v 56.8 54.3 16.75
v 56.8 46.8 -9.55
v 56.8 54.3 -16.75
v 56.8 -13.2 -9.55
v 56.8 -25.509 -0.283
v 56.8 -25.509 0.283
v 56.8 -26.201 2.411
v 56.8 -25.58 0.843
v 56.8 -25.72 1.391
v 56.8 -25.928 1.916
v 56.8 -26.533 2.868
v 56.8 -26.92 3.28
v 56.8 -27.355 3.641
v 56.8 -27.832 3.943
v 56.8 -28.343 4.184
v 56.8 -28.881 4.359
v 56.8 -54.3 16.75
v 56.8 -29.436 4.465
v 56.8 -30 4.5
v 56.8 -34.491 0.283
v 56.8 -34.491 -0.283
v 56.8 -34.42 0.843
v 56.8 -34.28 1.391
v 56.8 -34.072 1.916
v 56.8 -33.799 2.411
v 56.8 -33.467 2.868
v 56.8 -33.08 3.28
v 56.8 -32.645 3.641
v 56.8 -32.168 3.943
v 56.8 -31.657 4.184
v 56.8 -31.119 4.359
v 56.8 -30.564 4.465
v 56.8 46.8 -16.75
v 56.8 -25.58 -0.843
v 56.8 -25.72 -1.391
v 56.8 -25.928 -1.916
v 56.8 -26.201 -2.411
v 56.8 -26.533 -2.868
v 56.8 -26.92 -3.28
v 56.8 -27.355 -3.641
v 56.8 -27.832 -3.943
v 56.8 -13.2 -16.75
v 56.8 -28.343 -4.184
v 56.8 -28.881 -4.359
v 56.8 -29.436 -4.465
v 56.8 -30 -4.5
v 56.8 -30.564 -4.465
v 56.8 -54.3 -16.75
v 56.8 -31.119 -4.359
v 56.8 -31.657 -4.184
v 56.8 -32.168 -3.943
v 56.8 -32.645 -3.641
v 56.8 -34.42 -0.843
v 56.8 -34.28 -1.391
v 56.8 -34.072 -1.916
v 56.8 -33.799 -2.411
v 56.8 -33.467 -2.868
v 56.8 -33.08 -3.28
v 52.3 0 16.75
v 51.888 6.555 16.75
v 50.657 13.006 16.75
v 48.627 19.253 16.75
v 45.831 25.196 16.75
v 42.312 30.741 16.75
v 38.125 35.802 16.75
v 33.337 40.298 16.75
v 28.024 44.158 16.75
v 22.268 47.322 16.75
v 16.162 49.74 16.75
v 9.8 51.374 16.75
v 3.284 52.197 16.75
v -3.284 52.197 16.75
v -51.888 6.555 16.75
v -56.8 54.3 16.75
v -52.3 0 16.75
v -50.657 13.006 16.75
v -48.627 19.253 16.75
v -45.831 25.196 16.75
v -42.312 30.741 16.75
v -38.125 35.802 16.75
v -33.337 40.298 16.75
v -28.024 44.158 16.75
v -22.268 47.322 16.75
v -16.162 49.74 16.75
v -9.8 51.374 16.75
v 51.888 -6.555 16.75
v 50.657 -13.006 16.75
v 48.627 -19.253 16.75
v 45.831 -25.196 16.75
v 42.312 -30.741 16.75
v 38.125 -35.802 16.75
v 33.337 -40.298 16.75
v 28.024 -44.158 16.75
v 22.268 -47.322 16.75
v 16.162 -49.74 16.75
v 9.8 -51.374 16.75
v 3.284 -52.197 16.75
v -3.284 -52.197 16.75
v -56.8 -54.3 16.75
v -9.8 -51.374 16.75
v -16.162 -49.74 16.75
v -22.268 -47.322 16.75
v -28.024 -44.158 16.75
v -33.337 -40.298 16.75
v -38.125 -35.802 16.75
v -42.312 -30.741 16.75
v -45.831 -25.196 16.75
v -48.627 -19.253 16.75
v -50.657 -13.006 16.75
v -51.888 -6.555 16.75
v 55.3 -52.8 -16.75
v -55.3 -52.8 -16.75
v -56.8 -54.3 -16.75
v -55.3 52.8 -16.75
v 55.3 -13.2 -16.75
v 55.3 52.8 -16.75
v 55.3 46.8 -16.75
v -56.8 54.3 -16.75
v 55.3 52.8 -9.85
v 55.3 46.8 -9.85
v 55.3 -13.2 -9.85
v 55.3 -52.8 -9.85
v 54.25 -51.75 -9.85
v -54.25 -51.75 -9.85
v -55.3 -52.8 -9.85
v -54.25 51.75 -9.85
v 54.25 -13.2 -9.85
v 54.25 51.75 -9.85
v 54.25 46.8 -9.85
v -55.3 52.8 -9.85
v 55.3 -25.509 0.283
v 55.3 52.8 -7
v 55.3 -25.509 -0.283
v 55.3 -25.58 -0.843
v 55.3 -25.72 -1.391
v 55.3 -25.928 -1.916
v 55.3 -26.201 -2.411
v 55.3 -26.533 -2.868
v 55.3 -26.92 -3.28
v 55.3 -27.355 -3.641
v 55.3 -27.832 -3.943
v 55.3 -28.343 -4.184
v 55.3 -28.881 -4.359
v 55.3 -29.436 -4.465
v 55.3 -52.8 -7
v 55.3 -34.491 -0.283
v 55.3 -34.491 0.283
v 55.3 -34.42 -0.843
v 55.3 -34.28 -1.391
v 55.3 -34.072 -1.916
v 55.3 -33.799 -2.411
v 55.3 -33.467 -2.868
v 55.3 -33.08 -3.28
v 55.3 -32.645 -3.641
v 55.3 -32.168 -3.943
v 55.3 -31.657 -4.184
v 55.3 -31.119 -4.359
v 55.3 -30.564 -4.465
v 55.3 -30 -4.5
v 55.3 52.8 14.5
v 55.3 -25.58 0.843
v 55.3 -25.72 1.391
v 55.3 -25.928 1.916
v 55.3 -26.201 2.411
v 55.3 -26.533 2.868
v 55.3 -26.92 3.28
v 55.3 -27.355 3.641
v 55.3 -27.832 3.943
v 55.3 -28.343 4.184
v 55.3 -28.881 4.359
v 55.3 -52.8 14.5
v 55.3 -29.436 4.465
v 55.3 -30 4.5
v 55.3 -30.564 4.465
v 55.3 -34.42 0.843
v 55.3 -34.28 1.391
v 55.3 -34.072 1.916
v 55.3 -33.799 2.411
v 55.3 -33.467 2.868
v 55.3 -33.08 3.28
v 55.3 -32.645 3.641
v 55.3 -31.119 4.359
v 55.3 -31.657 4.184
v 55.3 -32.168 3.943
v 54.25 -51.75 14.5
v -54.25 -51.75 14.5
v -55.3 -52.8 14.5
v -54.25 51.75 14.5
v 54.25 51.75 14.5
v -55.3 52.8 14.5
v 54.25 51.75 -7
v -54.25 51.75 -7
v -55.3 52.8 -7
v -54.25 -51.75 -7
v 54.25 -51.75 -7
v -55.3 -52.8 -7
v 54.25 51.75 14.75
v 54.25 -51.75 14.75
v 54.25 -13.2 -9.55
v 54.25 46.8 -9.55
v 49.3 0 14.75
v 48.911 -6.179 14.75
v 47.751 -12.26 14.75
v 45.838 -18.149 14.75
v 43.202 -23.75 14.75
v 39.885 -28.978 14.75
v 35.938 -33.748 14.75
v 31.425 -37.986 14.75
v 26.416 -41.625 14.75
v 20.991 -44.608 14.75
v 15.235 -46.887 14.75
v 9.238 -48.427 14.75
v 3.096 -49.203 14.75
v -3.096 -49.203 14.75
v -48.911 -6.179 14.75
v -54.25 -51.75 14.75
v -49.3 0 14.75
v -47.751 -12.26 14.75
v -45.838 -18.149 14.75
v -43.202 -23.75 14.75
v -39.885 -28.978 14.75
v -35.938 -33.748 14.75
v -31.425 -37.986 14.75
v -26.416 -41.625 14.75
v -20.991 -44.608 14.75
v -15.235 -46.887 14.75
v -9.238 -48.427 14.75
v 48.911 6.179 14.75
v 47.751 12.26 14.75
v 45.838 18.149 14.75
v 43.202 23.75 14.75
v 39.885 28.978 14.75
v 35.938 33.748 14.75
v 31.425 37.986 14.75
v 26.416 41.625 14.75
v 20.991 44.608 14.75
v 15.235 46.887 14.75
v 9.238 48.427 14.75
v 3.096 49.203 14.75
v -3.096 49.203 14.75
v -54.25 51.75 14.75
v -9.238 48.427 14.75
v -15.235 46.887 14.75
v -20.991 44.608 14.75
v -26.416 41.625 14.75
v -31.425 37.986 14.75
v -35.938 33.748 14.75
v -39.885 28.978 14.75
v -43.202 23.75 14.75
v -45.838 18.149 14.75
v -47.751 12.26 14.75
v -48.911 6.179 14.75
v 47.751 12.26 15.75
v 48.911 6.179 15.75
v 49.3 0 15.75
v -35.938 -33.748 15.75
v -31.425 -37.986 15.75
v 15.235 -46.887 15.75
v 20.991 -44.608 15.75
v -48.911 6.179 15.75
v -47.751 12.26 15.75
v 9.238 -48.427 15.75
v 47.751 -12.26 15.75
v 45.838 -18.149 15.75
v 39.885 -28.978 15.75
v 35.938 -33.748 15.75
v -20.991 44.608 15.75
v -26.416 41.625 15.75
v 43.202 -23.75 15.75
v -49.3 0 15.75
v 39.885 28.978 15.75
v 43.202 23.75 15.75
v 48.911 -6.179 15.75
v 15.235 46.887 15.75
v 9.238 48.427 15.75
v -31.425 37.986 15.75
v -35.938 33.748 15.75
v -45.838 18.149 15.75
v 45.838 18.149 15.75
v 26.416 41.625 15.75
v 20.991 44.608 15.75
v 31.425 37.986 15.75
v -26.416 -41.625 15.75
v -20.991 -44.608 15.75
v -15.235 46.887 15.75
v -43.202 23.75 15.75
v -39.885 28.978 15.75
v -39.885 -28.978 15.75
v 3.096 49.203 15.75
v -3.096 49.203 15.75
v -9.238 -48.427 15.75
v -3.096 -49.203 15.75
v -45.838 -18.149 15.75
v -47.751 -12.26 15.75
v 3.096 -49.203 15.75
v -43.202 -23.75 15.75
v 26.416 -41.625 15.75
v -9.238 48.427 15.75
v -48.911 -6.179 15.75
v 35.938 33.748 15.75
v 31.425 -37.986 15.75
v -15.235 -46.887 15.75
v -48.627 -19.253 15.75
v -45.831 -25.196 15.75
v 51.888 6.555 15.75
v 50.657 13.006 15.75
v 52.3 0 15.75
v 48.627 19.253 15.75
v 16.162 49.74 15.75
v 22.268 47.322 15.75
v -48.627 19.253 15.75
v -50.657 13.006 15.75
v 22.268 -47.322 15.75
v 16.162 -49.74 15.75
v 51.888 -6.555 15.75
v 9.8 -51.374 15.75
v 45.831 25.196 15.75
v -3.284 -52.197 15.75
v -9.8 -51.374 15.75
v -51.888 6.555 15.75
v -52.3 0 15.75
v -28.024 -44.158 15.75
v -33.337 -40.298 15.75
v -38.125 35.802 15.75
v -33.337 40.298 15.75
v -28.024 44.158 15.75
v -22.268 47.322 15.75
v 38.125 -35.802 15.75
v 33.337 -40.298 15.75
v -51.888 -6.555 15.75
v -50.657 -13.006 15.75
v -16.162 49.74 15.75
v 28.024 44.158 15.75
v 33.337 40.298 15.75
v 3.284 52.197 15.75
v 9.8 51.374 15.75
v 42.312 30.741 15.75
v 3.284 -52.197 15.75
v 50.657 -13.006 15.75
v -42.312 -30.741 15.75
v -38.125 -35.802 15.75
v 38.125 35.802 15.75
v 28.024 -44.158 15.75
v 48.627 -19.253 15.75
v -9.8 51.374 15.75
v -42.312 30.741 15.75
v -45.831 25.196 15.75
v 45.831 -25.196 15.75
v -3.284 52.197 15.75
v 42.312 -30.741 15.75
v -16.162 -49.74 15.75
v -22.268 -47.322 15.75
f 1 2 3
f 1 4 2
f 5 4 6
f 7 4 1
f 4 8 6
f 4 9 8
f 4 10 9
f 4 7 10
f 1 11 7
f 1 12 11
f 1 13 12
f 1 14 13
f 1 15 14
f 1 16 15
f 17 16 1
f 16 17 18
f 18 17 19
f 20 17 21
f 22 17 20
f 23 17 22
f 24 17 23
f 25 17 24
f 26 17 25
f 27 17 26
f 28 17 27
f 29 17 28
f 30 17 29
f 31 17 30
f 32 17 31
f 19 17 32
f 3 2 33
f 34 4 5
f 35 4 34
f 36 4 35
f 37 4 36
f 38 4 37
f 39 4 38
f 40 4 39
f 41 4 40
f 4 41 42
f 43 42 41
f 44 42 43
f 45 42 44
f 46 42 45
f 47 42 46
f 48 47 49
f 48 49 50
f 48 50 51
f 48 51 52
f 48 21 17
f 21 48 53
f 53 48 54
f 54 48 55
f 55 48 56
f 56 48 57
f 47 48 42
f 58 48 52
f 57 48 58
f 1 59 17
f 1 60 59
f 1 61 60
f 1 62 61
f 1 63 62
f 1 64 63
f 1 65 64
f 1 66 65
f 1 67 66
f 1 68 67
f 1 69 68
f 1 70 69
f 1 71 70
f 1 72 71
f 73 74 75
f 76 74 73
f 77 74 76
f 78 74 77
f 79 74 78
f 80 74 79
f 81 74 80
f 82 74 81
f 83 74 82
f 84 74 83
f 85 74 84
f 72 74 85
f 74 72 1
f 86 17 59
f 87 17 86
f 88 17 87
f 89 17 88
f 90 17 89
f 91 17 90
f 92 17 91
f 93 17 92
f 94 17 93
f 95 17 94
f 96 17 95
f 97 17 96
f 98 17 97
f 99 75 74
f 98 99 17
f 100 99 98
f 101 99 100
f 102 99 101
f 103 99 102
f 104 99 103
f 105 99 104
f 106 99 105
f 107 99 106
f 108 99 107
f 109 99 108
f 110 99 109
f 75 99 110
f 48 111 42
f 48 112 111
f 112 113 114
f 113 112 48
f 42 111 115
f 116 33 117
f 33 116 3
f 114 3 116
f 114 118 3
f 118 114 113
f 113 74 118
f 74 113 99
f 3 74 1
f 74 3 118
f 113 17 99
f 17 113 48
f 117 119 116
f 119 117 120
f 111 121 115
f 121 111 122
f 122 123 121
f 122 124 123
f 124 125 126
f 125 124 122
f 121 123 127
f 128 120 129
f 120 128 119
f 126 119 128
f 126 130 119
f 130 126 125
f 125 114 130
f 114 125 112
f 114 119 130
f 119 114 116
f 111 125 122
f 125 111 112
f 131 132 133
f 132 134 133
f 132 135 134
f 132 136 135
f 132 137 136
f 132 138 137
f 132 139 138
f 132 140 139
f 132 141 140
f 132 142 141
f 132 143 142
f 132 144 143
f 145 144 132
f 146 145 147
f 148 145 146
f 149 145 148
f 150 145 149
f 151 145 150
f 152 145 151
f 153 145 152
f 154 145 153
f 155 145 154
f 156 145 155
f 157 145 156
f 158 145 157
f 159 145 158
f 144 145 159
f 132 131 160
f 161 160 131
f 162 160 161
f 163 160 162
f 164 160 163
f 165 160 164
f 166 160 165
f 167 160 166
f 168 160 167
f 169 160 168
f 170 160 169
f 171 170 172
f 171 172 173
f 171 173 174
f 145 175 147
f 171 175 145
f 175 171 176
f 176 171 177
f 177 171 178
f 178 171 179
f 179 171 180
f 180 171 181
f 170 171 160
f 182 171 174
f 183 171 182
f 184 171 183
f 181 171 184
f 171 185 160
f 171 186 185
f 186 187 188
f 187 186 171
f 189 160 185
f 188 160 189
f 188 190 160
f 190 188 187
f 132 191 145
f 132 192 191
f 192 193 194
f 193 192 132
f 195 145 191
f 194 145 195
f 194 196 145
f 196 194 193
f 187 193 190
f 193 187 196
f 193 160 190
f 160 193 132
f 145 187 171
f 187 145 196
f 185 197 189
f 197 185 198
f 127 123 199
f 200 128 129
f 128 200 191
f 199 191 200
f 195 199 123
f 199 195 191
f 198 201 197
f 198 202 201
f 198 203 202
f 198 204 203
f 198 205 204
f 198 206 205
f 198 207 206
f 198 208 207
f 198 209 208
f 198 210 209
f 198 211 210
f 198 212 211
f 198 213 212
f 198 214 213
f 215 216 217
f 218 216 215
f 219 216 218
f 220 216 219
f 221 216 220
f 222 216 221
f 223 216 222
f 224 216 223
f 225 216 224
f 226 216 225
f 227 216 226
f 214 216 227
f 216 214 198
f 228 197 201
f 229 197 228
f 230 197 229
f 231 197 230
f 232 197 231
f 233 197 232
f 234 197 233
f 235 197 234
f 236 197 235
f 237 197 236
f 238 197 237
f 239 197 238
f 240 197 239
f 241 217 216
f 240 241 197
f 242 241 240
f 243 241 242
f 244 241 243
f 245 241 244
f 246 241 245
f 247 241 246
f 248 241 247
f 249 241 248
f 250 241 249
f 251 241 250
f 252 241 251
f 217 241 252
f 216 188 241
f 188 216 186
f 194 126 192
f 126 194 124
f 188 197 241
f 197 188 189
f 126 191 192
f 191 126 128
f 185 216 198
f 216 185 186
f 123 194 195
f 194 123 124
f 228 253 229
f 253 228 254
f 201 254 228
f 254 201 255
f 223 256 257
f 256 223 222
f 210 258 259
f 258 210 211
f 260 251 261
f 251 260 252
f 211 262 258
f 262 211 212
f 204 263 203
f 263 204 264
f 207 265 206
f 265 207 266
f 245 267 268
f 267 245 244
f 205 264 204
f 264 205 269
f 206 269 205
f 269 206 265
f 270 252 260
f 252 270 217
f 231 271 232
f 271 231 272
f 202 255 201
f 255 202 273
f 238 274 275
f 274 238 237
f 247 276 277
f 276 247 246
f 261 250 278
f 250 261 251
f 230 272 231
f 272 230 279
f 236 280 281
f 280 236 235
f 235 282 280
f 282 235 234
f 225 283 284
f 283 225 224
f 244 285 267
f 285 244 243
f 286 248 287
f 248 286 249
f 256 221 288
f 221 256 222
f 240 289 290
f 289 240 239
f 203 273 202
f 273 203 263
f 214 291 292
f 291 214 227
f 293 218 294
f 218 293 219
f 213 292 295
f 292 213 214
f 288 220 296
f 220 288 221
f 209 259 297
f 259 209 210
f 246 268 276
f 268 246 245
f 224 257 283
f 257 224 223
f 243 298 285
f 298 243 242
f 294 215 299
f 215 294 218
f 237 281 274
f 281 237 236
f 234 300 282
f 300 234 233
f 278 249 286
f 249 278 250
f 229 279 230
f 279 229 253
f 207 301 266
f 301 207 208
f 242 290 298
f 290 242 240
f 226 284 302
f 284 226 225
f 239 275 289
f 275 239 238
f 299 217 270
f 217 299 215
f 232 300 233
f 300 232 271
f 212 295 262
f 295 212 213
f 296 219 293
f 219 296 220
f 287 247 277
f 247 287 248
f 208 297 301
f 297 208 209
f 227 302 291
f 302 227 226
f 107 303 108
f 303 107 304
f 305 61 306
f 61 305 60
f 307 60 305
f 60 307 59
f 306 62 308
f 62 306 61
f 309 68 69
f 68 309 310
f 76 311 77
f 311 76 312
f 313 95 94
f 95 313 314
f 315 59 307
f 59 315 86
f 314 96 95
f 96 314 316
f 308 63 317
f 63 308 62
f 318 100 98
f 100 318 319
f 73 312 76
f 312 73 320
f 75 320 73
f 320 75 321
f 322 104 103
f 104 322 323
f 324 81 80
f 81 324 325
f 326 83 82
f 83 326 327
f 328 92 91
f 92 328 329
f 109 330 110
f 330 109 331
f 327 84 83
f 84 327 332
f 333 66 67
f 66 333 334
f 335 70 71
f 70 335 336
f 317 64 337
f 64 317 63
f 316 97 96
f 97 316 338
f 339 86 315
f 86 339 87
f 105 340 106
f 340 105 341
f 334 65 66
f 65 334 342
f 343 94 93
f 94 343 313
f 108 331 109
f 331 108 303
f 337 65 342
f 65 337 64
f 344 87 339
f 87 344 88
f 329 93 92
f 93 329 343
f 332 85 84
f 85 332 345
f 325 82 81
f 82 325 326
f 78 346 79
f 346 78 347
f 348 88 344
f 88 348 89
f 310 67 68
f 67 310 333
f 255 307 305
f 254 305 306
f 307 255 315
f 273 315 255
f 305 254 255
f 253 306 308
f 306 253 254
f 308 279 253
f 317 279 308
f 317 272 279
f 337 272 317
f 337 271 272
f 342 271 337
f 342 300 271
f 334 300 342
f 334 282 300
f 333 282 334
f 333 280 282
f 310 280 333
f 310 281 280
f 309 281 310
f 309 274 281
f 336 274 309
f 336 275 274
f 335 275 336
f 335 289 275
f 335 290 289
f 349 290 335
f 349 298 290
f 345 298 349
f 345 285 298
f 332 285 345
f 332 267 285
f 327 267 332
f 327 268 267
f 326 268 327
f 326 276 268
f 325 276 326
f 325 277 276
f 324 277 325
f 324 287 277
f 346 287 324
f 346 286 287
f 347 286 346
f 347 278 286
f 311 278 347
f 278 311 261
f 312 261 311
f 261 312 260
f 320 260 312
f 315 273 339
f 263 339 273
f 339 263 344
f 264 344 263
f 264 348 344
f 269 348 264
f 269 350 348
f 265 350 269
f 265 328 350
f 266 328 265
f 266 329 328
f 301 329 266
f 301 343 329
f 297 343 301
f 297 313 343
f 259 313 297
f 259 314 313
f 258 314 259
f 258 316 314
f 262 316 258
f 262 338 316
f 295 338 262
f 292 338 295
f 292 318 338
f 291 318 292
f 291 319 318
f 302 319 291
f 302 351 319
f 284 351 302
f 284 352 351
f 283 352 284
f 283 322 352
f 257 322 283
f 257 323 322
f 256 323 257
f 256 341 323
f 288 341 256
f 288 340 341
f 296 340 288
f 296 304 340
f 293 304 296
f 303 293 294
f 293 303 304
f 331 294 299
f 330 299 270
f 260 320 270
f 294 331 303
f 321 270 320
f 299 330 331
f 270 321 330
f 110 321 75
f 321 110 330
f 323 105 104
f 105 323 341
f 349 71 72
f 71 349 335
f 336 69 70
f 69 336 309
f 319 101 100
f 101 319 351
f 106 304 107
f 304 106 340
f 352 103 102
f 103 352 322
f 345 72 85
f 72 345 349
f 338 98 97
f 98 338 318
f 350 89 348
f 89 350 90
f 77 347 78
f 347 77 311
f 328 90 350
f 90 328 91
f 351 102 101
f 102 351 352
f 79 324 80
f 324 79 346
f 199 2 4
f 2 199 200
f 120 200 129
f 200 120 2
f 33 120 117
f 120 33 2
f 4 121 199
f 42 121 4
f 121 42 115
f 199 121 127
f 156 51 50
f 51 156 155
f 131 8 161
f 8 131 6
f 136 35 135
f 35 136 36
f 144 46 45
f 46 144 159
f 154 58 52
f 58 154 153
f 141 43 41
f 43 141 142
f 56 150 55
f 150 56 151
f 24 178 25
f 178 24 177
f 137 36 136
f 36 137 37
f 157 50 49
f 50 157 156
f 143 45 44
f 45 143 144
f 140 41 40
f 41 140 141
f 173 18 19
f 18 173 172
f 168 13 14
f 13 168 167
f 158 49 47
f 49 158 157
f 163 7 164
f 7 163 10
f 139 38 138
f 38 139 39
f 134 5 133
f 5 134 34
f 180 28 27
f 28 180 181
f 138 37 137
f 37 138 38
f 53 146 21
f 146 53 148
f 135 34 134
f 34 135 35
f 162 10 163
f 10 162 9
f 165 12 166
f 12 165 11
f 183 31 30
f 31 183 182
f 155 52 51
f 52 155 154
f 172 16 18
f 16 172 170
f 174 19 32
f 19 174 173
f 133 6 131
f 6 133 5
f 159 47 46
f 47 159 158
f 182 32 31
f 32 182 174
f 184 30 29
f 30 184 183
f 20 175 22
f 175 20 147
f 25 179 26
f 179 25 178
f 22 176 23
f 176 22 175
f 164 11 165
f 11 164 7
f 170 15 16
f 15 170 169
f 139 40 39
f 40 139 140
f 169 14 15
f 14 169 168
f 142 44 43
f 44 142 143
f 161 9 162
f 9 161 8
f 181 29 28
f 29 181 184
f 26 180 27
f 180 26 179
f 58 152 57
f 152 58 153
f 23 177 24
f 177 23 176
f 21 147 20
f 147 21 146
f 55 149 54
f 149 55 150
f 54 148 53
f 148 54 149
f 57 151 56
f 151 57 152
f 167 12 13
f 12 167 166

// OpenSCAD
$fn=50;

pi_x = 85;
pi_y = 56;
pi_z = 13;

x_clearance = 1;
y_clearance = 1;

wall_thickness = 1.5;

x_buffer = 15;
y_buffer = 15;

usb_buffer = 24;

floor_z = 1;

usb_y = 15;

ethernet_y = 20;

middle_x = pi_x+x_buffer + (wall_thickness + x_clearance) * 4;
middle_x_hole = pi_x+x_buffer + (wall_thickness + x_clearance*2) * 2;

middle_y = pi_y+ usb_buffer + y_buffer + (y_clearance + wall_thickness)*4;
middle_y_hole = pi_y+ usb_buffer + y_buffer + (y_clearance * 2 + wall_thickness)*2;

middle_z = 8;

servo_x = 23;
servo_y = 12.5;
servo_z = 1.5;

servo_x_offset = servo_x/2 - 6;

servo_x_clearance = 0.5;
servo_y_clearance = 0.5;

top_x_clearance = 0.3;
top_y_clearance = 0.3;

top_x = middle_x + (wall_thickness + top_x_clearance) * 2;
top_y = middle_y + (wall_thickness + top_y_clearance) * 2;

top_x_large_hole = middle_x + top_x_clearance*2;
top_y_large_hole = middle_y + top_y_clearance*2;

top_x_small_hole = middle_x - wall_thickness;
top_y_small_hole = middle_y - wall_thickness;
lip = 7;
top_z = 26.5 + lip;

ethernet_hole_x = 22+(wall_thickness + x_clearance)*3;


difference(){
    cube([top_x, top_y, top_z], center=true);
    
    translate([0,0, -top_z/2 + lip/2-.1])
    cube([top_x_large_hole, top_y_large_hole, lip], center=true);
    
    translate([0,0, (top_z)/2-lip-6])
    cube([top_x_large_hole, top_y_large_hole, top_z-lip-5], center=true);
    
    translate([0,0, -2])
    cube([top_x_small_hole, top_y_small_hole, top_z], center=true);
    
    cylinder(r=top_y/2 - 5, 20);
    
    translate([0,0,top_z/2 - 1])
    cylinder(r=top_y/2 - 2, 2);

    translate([
        top_x/2 - ethernet_hole_x/2 + .1,
        -60/2 + top_y/2 - (wall_thickness + y_clearance)*3 ,
        -top_z/2 + lip - 8/2 +.1])
    cube([22+(wall_thickness + x_clearance)*3,60,8.2], center=true);
    
    translate([top_x/2,-30])
    rotate([0,90,0])
    cylinder(d=9, 10, center=true);


}




    
    
